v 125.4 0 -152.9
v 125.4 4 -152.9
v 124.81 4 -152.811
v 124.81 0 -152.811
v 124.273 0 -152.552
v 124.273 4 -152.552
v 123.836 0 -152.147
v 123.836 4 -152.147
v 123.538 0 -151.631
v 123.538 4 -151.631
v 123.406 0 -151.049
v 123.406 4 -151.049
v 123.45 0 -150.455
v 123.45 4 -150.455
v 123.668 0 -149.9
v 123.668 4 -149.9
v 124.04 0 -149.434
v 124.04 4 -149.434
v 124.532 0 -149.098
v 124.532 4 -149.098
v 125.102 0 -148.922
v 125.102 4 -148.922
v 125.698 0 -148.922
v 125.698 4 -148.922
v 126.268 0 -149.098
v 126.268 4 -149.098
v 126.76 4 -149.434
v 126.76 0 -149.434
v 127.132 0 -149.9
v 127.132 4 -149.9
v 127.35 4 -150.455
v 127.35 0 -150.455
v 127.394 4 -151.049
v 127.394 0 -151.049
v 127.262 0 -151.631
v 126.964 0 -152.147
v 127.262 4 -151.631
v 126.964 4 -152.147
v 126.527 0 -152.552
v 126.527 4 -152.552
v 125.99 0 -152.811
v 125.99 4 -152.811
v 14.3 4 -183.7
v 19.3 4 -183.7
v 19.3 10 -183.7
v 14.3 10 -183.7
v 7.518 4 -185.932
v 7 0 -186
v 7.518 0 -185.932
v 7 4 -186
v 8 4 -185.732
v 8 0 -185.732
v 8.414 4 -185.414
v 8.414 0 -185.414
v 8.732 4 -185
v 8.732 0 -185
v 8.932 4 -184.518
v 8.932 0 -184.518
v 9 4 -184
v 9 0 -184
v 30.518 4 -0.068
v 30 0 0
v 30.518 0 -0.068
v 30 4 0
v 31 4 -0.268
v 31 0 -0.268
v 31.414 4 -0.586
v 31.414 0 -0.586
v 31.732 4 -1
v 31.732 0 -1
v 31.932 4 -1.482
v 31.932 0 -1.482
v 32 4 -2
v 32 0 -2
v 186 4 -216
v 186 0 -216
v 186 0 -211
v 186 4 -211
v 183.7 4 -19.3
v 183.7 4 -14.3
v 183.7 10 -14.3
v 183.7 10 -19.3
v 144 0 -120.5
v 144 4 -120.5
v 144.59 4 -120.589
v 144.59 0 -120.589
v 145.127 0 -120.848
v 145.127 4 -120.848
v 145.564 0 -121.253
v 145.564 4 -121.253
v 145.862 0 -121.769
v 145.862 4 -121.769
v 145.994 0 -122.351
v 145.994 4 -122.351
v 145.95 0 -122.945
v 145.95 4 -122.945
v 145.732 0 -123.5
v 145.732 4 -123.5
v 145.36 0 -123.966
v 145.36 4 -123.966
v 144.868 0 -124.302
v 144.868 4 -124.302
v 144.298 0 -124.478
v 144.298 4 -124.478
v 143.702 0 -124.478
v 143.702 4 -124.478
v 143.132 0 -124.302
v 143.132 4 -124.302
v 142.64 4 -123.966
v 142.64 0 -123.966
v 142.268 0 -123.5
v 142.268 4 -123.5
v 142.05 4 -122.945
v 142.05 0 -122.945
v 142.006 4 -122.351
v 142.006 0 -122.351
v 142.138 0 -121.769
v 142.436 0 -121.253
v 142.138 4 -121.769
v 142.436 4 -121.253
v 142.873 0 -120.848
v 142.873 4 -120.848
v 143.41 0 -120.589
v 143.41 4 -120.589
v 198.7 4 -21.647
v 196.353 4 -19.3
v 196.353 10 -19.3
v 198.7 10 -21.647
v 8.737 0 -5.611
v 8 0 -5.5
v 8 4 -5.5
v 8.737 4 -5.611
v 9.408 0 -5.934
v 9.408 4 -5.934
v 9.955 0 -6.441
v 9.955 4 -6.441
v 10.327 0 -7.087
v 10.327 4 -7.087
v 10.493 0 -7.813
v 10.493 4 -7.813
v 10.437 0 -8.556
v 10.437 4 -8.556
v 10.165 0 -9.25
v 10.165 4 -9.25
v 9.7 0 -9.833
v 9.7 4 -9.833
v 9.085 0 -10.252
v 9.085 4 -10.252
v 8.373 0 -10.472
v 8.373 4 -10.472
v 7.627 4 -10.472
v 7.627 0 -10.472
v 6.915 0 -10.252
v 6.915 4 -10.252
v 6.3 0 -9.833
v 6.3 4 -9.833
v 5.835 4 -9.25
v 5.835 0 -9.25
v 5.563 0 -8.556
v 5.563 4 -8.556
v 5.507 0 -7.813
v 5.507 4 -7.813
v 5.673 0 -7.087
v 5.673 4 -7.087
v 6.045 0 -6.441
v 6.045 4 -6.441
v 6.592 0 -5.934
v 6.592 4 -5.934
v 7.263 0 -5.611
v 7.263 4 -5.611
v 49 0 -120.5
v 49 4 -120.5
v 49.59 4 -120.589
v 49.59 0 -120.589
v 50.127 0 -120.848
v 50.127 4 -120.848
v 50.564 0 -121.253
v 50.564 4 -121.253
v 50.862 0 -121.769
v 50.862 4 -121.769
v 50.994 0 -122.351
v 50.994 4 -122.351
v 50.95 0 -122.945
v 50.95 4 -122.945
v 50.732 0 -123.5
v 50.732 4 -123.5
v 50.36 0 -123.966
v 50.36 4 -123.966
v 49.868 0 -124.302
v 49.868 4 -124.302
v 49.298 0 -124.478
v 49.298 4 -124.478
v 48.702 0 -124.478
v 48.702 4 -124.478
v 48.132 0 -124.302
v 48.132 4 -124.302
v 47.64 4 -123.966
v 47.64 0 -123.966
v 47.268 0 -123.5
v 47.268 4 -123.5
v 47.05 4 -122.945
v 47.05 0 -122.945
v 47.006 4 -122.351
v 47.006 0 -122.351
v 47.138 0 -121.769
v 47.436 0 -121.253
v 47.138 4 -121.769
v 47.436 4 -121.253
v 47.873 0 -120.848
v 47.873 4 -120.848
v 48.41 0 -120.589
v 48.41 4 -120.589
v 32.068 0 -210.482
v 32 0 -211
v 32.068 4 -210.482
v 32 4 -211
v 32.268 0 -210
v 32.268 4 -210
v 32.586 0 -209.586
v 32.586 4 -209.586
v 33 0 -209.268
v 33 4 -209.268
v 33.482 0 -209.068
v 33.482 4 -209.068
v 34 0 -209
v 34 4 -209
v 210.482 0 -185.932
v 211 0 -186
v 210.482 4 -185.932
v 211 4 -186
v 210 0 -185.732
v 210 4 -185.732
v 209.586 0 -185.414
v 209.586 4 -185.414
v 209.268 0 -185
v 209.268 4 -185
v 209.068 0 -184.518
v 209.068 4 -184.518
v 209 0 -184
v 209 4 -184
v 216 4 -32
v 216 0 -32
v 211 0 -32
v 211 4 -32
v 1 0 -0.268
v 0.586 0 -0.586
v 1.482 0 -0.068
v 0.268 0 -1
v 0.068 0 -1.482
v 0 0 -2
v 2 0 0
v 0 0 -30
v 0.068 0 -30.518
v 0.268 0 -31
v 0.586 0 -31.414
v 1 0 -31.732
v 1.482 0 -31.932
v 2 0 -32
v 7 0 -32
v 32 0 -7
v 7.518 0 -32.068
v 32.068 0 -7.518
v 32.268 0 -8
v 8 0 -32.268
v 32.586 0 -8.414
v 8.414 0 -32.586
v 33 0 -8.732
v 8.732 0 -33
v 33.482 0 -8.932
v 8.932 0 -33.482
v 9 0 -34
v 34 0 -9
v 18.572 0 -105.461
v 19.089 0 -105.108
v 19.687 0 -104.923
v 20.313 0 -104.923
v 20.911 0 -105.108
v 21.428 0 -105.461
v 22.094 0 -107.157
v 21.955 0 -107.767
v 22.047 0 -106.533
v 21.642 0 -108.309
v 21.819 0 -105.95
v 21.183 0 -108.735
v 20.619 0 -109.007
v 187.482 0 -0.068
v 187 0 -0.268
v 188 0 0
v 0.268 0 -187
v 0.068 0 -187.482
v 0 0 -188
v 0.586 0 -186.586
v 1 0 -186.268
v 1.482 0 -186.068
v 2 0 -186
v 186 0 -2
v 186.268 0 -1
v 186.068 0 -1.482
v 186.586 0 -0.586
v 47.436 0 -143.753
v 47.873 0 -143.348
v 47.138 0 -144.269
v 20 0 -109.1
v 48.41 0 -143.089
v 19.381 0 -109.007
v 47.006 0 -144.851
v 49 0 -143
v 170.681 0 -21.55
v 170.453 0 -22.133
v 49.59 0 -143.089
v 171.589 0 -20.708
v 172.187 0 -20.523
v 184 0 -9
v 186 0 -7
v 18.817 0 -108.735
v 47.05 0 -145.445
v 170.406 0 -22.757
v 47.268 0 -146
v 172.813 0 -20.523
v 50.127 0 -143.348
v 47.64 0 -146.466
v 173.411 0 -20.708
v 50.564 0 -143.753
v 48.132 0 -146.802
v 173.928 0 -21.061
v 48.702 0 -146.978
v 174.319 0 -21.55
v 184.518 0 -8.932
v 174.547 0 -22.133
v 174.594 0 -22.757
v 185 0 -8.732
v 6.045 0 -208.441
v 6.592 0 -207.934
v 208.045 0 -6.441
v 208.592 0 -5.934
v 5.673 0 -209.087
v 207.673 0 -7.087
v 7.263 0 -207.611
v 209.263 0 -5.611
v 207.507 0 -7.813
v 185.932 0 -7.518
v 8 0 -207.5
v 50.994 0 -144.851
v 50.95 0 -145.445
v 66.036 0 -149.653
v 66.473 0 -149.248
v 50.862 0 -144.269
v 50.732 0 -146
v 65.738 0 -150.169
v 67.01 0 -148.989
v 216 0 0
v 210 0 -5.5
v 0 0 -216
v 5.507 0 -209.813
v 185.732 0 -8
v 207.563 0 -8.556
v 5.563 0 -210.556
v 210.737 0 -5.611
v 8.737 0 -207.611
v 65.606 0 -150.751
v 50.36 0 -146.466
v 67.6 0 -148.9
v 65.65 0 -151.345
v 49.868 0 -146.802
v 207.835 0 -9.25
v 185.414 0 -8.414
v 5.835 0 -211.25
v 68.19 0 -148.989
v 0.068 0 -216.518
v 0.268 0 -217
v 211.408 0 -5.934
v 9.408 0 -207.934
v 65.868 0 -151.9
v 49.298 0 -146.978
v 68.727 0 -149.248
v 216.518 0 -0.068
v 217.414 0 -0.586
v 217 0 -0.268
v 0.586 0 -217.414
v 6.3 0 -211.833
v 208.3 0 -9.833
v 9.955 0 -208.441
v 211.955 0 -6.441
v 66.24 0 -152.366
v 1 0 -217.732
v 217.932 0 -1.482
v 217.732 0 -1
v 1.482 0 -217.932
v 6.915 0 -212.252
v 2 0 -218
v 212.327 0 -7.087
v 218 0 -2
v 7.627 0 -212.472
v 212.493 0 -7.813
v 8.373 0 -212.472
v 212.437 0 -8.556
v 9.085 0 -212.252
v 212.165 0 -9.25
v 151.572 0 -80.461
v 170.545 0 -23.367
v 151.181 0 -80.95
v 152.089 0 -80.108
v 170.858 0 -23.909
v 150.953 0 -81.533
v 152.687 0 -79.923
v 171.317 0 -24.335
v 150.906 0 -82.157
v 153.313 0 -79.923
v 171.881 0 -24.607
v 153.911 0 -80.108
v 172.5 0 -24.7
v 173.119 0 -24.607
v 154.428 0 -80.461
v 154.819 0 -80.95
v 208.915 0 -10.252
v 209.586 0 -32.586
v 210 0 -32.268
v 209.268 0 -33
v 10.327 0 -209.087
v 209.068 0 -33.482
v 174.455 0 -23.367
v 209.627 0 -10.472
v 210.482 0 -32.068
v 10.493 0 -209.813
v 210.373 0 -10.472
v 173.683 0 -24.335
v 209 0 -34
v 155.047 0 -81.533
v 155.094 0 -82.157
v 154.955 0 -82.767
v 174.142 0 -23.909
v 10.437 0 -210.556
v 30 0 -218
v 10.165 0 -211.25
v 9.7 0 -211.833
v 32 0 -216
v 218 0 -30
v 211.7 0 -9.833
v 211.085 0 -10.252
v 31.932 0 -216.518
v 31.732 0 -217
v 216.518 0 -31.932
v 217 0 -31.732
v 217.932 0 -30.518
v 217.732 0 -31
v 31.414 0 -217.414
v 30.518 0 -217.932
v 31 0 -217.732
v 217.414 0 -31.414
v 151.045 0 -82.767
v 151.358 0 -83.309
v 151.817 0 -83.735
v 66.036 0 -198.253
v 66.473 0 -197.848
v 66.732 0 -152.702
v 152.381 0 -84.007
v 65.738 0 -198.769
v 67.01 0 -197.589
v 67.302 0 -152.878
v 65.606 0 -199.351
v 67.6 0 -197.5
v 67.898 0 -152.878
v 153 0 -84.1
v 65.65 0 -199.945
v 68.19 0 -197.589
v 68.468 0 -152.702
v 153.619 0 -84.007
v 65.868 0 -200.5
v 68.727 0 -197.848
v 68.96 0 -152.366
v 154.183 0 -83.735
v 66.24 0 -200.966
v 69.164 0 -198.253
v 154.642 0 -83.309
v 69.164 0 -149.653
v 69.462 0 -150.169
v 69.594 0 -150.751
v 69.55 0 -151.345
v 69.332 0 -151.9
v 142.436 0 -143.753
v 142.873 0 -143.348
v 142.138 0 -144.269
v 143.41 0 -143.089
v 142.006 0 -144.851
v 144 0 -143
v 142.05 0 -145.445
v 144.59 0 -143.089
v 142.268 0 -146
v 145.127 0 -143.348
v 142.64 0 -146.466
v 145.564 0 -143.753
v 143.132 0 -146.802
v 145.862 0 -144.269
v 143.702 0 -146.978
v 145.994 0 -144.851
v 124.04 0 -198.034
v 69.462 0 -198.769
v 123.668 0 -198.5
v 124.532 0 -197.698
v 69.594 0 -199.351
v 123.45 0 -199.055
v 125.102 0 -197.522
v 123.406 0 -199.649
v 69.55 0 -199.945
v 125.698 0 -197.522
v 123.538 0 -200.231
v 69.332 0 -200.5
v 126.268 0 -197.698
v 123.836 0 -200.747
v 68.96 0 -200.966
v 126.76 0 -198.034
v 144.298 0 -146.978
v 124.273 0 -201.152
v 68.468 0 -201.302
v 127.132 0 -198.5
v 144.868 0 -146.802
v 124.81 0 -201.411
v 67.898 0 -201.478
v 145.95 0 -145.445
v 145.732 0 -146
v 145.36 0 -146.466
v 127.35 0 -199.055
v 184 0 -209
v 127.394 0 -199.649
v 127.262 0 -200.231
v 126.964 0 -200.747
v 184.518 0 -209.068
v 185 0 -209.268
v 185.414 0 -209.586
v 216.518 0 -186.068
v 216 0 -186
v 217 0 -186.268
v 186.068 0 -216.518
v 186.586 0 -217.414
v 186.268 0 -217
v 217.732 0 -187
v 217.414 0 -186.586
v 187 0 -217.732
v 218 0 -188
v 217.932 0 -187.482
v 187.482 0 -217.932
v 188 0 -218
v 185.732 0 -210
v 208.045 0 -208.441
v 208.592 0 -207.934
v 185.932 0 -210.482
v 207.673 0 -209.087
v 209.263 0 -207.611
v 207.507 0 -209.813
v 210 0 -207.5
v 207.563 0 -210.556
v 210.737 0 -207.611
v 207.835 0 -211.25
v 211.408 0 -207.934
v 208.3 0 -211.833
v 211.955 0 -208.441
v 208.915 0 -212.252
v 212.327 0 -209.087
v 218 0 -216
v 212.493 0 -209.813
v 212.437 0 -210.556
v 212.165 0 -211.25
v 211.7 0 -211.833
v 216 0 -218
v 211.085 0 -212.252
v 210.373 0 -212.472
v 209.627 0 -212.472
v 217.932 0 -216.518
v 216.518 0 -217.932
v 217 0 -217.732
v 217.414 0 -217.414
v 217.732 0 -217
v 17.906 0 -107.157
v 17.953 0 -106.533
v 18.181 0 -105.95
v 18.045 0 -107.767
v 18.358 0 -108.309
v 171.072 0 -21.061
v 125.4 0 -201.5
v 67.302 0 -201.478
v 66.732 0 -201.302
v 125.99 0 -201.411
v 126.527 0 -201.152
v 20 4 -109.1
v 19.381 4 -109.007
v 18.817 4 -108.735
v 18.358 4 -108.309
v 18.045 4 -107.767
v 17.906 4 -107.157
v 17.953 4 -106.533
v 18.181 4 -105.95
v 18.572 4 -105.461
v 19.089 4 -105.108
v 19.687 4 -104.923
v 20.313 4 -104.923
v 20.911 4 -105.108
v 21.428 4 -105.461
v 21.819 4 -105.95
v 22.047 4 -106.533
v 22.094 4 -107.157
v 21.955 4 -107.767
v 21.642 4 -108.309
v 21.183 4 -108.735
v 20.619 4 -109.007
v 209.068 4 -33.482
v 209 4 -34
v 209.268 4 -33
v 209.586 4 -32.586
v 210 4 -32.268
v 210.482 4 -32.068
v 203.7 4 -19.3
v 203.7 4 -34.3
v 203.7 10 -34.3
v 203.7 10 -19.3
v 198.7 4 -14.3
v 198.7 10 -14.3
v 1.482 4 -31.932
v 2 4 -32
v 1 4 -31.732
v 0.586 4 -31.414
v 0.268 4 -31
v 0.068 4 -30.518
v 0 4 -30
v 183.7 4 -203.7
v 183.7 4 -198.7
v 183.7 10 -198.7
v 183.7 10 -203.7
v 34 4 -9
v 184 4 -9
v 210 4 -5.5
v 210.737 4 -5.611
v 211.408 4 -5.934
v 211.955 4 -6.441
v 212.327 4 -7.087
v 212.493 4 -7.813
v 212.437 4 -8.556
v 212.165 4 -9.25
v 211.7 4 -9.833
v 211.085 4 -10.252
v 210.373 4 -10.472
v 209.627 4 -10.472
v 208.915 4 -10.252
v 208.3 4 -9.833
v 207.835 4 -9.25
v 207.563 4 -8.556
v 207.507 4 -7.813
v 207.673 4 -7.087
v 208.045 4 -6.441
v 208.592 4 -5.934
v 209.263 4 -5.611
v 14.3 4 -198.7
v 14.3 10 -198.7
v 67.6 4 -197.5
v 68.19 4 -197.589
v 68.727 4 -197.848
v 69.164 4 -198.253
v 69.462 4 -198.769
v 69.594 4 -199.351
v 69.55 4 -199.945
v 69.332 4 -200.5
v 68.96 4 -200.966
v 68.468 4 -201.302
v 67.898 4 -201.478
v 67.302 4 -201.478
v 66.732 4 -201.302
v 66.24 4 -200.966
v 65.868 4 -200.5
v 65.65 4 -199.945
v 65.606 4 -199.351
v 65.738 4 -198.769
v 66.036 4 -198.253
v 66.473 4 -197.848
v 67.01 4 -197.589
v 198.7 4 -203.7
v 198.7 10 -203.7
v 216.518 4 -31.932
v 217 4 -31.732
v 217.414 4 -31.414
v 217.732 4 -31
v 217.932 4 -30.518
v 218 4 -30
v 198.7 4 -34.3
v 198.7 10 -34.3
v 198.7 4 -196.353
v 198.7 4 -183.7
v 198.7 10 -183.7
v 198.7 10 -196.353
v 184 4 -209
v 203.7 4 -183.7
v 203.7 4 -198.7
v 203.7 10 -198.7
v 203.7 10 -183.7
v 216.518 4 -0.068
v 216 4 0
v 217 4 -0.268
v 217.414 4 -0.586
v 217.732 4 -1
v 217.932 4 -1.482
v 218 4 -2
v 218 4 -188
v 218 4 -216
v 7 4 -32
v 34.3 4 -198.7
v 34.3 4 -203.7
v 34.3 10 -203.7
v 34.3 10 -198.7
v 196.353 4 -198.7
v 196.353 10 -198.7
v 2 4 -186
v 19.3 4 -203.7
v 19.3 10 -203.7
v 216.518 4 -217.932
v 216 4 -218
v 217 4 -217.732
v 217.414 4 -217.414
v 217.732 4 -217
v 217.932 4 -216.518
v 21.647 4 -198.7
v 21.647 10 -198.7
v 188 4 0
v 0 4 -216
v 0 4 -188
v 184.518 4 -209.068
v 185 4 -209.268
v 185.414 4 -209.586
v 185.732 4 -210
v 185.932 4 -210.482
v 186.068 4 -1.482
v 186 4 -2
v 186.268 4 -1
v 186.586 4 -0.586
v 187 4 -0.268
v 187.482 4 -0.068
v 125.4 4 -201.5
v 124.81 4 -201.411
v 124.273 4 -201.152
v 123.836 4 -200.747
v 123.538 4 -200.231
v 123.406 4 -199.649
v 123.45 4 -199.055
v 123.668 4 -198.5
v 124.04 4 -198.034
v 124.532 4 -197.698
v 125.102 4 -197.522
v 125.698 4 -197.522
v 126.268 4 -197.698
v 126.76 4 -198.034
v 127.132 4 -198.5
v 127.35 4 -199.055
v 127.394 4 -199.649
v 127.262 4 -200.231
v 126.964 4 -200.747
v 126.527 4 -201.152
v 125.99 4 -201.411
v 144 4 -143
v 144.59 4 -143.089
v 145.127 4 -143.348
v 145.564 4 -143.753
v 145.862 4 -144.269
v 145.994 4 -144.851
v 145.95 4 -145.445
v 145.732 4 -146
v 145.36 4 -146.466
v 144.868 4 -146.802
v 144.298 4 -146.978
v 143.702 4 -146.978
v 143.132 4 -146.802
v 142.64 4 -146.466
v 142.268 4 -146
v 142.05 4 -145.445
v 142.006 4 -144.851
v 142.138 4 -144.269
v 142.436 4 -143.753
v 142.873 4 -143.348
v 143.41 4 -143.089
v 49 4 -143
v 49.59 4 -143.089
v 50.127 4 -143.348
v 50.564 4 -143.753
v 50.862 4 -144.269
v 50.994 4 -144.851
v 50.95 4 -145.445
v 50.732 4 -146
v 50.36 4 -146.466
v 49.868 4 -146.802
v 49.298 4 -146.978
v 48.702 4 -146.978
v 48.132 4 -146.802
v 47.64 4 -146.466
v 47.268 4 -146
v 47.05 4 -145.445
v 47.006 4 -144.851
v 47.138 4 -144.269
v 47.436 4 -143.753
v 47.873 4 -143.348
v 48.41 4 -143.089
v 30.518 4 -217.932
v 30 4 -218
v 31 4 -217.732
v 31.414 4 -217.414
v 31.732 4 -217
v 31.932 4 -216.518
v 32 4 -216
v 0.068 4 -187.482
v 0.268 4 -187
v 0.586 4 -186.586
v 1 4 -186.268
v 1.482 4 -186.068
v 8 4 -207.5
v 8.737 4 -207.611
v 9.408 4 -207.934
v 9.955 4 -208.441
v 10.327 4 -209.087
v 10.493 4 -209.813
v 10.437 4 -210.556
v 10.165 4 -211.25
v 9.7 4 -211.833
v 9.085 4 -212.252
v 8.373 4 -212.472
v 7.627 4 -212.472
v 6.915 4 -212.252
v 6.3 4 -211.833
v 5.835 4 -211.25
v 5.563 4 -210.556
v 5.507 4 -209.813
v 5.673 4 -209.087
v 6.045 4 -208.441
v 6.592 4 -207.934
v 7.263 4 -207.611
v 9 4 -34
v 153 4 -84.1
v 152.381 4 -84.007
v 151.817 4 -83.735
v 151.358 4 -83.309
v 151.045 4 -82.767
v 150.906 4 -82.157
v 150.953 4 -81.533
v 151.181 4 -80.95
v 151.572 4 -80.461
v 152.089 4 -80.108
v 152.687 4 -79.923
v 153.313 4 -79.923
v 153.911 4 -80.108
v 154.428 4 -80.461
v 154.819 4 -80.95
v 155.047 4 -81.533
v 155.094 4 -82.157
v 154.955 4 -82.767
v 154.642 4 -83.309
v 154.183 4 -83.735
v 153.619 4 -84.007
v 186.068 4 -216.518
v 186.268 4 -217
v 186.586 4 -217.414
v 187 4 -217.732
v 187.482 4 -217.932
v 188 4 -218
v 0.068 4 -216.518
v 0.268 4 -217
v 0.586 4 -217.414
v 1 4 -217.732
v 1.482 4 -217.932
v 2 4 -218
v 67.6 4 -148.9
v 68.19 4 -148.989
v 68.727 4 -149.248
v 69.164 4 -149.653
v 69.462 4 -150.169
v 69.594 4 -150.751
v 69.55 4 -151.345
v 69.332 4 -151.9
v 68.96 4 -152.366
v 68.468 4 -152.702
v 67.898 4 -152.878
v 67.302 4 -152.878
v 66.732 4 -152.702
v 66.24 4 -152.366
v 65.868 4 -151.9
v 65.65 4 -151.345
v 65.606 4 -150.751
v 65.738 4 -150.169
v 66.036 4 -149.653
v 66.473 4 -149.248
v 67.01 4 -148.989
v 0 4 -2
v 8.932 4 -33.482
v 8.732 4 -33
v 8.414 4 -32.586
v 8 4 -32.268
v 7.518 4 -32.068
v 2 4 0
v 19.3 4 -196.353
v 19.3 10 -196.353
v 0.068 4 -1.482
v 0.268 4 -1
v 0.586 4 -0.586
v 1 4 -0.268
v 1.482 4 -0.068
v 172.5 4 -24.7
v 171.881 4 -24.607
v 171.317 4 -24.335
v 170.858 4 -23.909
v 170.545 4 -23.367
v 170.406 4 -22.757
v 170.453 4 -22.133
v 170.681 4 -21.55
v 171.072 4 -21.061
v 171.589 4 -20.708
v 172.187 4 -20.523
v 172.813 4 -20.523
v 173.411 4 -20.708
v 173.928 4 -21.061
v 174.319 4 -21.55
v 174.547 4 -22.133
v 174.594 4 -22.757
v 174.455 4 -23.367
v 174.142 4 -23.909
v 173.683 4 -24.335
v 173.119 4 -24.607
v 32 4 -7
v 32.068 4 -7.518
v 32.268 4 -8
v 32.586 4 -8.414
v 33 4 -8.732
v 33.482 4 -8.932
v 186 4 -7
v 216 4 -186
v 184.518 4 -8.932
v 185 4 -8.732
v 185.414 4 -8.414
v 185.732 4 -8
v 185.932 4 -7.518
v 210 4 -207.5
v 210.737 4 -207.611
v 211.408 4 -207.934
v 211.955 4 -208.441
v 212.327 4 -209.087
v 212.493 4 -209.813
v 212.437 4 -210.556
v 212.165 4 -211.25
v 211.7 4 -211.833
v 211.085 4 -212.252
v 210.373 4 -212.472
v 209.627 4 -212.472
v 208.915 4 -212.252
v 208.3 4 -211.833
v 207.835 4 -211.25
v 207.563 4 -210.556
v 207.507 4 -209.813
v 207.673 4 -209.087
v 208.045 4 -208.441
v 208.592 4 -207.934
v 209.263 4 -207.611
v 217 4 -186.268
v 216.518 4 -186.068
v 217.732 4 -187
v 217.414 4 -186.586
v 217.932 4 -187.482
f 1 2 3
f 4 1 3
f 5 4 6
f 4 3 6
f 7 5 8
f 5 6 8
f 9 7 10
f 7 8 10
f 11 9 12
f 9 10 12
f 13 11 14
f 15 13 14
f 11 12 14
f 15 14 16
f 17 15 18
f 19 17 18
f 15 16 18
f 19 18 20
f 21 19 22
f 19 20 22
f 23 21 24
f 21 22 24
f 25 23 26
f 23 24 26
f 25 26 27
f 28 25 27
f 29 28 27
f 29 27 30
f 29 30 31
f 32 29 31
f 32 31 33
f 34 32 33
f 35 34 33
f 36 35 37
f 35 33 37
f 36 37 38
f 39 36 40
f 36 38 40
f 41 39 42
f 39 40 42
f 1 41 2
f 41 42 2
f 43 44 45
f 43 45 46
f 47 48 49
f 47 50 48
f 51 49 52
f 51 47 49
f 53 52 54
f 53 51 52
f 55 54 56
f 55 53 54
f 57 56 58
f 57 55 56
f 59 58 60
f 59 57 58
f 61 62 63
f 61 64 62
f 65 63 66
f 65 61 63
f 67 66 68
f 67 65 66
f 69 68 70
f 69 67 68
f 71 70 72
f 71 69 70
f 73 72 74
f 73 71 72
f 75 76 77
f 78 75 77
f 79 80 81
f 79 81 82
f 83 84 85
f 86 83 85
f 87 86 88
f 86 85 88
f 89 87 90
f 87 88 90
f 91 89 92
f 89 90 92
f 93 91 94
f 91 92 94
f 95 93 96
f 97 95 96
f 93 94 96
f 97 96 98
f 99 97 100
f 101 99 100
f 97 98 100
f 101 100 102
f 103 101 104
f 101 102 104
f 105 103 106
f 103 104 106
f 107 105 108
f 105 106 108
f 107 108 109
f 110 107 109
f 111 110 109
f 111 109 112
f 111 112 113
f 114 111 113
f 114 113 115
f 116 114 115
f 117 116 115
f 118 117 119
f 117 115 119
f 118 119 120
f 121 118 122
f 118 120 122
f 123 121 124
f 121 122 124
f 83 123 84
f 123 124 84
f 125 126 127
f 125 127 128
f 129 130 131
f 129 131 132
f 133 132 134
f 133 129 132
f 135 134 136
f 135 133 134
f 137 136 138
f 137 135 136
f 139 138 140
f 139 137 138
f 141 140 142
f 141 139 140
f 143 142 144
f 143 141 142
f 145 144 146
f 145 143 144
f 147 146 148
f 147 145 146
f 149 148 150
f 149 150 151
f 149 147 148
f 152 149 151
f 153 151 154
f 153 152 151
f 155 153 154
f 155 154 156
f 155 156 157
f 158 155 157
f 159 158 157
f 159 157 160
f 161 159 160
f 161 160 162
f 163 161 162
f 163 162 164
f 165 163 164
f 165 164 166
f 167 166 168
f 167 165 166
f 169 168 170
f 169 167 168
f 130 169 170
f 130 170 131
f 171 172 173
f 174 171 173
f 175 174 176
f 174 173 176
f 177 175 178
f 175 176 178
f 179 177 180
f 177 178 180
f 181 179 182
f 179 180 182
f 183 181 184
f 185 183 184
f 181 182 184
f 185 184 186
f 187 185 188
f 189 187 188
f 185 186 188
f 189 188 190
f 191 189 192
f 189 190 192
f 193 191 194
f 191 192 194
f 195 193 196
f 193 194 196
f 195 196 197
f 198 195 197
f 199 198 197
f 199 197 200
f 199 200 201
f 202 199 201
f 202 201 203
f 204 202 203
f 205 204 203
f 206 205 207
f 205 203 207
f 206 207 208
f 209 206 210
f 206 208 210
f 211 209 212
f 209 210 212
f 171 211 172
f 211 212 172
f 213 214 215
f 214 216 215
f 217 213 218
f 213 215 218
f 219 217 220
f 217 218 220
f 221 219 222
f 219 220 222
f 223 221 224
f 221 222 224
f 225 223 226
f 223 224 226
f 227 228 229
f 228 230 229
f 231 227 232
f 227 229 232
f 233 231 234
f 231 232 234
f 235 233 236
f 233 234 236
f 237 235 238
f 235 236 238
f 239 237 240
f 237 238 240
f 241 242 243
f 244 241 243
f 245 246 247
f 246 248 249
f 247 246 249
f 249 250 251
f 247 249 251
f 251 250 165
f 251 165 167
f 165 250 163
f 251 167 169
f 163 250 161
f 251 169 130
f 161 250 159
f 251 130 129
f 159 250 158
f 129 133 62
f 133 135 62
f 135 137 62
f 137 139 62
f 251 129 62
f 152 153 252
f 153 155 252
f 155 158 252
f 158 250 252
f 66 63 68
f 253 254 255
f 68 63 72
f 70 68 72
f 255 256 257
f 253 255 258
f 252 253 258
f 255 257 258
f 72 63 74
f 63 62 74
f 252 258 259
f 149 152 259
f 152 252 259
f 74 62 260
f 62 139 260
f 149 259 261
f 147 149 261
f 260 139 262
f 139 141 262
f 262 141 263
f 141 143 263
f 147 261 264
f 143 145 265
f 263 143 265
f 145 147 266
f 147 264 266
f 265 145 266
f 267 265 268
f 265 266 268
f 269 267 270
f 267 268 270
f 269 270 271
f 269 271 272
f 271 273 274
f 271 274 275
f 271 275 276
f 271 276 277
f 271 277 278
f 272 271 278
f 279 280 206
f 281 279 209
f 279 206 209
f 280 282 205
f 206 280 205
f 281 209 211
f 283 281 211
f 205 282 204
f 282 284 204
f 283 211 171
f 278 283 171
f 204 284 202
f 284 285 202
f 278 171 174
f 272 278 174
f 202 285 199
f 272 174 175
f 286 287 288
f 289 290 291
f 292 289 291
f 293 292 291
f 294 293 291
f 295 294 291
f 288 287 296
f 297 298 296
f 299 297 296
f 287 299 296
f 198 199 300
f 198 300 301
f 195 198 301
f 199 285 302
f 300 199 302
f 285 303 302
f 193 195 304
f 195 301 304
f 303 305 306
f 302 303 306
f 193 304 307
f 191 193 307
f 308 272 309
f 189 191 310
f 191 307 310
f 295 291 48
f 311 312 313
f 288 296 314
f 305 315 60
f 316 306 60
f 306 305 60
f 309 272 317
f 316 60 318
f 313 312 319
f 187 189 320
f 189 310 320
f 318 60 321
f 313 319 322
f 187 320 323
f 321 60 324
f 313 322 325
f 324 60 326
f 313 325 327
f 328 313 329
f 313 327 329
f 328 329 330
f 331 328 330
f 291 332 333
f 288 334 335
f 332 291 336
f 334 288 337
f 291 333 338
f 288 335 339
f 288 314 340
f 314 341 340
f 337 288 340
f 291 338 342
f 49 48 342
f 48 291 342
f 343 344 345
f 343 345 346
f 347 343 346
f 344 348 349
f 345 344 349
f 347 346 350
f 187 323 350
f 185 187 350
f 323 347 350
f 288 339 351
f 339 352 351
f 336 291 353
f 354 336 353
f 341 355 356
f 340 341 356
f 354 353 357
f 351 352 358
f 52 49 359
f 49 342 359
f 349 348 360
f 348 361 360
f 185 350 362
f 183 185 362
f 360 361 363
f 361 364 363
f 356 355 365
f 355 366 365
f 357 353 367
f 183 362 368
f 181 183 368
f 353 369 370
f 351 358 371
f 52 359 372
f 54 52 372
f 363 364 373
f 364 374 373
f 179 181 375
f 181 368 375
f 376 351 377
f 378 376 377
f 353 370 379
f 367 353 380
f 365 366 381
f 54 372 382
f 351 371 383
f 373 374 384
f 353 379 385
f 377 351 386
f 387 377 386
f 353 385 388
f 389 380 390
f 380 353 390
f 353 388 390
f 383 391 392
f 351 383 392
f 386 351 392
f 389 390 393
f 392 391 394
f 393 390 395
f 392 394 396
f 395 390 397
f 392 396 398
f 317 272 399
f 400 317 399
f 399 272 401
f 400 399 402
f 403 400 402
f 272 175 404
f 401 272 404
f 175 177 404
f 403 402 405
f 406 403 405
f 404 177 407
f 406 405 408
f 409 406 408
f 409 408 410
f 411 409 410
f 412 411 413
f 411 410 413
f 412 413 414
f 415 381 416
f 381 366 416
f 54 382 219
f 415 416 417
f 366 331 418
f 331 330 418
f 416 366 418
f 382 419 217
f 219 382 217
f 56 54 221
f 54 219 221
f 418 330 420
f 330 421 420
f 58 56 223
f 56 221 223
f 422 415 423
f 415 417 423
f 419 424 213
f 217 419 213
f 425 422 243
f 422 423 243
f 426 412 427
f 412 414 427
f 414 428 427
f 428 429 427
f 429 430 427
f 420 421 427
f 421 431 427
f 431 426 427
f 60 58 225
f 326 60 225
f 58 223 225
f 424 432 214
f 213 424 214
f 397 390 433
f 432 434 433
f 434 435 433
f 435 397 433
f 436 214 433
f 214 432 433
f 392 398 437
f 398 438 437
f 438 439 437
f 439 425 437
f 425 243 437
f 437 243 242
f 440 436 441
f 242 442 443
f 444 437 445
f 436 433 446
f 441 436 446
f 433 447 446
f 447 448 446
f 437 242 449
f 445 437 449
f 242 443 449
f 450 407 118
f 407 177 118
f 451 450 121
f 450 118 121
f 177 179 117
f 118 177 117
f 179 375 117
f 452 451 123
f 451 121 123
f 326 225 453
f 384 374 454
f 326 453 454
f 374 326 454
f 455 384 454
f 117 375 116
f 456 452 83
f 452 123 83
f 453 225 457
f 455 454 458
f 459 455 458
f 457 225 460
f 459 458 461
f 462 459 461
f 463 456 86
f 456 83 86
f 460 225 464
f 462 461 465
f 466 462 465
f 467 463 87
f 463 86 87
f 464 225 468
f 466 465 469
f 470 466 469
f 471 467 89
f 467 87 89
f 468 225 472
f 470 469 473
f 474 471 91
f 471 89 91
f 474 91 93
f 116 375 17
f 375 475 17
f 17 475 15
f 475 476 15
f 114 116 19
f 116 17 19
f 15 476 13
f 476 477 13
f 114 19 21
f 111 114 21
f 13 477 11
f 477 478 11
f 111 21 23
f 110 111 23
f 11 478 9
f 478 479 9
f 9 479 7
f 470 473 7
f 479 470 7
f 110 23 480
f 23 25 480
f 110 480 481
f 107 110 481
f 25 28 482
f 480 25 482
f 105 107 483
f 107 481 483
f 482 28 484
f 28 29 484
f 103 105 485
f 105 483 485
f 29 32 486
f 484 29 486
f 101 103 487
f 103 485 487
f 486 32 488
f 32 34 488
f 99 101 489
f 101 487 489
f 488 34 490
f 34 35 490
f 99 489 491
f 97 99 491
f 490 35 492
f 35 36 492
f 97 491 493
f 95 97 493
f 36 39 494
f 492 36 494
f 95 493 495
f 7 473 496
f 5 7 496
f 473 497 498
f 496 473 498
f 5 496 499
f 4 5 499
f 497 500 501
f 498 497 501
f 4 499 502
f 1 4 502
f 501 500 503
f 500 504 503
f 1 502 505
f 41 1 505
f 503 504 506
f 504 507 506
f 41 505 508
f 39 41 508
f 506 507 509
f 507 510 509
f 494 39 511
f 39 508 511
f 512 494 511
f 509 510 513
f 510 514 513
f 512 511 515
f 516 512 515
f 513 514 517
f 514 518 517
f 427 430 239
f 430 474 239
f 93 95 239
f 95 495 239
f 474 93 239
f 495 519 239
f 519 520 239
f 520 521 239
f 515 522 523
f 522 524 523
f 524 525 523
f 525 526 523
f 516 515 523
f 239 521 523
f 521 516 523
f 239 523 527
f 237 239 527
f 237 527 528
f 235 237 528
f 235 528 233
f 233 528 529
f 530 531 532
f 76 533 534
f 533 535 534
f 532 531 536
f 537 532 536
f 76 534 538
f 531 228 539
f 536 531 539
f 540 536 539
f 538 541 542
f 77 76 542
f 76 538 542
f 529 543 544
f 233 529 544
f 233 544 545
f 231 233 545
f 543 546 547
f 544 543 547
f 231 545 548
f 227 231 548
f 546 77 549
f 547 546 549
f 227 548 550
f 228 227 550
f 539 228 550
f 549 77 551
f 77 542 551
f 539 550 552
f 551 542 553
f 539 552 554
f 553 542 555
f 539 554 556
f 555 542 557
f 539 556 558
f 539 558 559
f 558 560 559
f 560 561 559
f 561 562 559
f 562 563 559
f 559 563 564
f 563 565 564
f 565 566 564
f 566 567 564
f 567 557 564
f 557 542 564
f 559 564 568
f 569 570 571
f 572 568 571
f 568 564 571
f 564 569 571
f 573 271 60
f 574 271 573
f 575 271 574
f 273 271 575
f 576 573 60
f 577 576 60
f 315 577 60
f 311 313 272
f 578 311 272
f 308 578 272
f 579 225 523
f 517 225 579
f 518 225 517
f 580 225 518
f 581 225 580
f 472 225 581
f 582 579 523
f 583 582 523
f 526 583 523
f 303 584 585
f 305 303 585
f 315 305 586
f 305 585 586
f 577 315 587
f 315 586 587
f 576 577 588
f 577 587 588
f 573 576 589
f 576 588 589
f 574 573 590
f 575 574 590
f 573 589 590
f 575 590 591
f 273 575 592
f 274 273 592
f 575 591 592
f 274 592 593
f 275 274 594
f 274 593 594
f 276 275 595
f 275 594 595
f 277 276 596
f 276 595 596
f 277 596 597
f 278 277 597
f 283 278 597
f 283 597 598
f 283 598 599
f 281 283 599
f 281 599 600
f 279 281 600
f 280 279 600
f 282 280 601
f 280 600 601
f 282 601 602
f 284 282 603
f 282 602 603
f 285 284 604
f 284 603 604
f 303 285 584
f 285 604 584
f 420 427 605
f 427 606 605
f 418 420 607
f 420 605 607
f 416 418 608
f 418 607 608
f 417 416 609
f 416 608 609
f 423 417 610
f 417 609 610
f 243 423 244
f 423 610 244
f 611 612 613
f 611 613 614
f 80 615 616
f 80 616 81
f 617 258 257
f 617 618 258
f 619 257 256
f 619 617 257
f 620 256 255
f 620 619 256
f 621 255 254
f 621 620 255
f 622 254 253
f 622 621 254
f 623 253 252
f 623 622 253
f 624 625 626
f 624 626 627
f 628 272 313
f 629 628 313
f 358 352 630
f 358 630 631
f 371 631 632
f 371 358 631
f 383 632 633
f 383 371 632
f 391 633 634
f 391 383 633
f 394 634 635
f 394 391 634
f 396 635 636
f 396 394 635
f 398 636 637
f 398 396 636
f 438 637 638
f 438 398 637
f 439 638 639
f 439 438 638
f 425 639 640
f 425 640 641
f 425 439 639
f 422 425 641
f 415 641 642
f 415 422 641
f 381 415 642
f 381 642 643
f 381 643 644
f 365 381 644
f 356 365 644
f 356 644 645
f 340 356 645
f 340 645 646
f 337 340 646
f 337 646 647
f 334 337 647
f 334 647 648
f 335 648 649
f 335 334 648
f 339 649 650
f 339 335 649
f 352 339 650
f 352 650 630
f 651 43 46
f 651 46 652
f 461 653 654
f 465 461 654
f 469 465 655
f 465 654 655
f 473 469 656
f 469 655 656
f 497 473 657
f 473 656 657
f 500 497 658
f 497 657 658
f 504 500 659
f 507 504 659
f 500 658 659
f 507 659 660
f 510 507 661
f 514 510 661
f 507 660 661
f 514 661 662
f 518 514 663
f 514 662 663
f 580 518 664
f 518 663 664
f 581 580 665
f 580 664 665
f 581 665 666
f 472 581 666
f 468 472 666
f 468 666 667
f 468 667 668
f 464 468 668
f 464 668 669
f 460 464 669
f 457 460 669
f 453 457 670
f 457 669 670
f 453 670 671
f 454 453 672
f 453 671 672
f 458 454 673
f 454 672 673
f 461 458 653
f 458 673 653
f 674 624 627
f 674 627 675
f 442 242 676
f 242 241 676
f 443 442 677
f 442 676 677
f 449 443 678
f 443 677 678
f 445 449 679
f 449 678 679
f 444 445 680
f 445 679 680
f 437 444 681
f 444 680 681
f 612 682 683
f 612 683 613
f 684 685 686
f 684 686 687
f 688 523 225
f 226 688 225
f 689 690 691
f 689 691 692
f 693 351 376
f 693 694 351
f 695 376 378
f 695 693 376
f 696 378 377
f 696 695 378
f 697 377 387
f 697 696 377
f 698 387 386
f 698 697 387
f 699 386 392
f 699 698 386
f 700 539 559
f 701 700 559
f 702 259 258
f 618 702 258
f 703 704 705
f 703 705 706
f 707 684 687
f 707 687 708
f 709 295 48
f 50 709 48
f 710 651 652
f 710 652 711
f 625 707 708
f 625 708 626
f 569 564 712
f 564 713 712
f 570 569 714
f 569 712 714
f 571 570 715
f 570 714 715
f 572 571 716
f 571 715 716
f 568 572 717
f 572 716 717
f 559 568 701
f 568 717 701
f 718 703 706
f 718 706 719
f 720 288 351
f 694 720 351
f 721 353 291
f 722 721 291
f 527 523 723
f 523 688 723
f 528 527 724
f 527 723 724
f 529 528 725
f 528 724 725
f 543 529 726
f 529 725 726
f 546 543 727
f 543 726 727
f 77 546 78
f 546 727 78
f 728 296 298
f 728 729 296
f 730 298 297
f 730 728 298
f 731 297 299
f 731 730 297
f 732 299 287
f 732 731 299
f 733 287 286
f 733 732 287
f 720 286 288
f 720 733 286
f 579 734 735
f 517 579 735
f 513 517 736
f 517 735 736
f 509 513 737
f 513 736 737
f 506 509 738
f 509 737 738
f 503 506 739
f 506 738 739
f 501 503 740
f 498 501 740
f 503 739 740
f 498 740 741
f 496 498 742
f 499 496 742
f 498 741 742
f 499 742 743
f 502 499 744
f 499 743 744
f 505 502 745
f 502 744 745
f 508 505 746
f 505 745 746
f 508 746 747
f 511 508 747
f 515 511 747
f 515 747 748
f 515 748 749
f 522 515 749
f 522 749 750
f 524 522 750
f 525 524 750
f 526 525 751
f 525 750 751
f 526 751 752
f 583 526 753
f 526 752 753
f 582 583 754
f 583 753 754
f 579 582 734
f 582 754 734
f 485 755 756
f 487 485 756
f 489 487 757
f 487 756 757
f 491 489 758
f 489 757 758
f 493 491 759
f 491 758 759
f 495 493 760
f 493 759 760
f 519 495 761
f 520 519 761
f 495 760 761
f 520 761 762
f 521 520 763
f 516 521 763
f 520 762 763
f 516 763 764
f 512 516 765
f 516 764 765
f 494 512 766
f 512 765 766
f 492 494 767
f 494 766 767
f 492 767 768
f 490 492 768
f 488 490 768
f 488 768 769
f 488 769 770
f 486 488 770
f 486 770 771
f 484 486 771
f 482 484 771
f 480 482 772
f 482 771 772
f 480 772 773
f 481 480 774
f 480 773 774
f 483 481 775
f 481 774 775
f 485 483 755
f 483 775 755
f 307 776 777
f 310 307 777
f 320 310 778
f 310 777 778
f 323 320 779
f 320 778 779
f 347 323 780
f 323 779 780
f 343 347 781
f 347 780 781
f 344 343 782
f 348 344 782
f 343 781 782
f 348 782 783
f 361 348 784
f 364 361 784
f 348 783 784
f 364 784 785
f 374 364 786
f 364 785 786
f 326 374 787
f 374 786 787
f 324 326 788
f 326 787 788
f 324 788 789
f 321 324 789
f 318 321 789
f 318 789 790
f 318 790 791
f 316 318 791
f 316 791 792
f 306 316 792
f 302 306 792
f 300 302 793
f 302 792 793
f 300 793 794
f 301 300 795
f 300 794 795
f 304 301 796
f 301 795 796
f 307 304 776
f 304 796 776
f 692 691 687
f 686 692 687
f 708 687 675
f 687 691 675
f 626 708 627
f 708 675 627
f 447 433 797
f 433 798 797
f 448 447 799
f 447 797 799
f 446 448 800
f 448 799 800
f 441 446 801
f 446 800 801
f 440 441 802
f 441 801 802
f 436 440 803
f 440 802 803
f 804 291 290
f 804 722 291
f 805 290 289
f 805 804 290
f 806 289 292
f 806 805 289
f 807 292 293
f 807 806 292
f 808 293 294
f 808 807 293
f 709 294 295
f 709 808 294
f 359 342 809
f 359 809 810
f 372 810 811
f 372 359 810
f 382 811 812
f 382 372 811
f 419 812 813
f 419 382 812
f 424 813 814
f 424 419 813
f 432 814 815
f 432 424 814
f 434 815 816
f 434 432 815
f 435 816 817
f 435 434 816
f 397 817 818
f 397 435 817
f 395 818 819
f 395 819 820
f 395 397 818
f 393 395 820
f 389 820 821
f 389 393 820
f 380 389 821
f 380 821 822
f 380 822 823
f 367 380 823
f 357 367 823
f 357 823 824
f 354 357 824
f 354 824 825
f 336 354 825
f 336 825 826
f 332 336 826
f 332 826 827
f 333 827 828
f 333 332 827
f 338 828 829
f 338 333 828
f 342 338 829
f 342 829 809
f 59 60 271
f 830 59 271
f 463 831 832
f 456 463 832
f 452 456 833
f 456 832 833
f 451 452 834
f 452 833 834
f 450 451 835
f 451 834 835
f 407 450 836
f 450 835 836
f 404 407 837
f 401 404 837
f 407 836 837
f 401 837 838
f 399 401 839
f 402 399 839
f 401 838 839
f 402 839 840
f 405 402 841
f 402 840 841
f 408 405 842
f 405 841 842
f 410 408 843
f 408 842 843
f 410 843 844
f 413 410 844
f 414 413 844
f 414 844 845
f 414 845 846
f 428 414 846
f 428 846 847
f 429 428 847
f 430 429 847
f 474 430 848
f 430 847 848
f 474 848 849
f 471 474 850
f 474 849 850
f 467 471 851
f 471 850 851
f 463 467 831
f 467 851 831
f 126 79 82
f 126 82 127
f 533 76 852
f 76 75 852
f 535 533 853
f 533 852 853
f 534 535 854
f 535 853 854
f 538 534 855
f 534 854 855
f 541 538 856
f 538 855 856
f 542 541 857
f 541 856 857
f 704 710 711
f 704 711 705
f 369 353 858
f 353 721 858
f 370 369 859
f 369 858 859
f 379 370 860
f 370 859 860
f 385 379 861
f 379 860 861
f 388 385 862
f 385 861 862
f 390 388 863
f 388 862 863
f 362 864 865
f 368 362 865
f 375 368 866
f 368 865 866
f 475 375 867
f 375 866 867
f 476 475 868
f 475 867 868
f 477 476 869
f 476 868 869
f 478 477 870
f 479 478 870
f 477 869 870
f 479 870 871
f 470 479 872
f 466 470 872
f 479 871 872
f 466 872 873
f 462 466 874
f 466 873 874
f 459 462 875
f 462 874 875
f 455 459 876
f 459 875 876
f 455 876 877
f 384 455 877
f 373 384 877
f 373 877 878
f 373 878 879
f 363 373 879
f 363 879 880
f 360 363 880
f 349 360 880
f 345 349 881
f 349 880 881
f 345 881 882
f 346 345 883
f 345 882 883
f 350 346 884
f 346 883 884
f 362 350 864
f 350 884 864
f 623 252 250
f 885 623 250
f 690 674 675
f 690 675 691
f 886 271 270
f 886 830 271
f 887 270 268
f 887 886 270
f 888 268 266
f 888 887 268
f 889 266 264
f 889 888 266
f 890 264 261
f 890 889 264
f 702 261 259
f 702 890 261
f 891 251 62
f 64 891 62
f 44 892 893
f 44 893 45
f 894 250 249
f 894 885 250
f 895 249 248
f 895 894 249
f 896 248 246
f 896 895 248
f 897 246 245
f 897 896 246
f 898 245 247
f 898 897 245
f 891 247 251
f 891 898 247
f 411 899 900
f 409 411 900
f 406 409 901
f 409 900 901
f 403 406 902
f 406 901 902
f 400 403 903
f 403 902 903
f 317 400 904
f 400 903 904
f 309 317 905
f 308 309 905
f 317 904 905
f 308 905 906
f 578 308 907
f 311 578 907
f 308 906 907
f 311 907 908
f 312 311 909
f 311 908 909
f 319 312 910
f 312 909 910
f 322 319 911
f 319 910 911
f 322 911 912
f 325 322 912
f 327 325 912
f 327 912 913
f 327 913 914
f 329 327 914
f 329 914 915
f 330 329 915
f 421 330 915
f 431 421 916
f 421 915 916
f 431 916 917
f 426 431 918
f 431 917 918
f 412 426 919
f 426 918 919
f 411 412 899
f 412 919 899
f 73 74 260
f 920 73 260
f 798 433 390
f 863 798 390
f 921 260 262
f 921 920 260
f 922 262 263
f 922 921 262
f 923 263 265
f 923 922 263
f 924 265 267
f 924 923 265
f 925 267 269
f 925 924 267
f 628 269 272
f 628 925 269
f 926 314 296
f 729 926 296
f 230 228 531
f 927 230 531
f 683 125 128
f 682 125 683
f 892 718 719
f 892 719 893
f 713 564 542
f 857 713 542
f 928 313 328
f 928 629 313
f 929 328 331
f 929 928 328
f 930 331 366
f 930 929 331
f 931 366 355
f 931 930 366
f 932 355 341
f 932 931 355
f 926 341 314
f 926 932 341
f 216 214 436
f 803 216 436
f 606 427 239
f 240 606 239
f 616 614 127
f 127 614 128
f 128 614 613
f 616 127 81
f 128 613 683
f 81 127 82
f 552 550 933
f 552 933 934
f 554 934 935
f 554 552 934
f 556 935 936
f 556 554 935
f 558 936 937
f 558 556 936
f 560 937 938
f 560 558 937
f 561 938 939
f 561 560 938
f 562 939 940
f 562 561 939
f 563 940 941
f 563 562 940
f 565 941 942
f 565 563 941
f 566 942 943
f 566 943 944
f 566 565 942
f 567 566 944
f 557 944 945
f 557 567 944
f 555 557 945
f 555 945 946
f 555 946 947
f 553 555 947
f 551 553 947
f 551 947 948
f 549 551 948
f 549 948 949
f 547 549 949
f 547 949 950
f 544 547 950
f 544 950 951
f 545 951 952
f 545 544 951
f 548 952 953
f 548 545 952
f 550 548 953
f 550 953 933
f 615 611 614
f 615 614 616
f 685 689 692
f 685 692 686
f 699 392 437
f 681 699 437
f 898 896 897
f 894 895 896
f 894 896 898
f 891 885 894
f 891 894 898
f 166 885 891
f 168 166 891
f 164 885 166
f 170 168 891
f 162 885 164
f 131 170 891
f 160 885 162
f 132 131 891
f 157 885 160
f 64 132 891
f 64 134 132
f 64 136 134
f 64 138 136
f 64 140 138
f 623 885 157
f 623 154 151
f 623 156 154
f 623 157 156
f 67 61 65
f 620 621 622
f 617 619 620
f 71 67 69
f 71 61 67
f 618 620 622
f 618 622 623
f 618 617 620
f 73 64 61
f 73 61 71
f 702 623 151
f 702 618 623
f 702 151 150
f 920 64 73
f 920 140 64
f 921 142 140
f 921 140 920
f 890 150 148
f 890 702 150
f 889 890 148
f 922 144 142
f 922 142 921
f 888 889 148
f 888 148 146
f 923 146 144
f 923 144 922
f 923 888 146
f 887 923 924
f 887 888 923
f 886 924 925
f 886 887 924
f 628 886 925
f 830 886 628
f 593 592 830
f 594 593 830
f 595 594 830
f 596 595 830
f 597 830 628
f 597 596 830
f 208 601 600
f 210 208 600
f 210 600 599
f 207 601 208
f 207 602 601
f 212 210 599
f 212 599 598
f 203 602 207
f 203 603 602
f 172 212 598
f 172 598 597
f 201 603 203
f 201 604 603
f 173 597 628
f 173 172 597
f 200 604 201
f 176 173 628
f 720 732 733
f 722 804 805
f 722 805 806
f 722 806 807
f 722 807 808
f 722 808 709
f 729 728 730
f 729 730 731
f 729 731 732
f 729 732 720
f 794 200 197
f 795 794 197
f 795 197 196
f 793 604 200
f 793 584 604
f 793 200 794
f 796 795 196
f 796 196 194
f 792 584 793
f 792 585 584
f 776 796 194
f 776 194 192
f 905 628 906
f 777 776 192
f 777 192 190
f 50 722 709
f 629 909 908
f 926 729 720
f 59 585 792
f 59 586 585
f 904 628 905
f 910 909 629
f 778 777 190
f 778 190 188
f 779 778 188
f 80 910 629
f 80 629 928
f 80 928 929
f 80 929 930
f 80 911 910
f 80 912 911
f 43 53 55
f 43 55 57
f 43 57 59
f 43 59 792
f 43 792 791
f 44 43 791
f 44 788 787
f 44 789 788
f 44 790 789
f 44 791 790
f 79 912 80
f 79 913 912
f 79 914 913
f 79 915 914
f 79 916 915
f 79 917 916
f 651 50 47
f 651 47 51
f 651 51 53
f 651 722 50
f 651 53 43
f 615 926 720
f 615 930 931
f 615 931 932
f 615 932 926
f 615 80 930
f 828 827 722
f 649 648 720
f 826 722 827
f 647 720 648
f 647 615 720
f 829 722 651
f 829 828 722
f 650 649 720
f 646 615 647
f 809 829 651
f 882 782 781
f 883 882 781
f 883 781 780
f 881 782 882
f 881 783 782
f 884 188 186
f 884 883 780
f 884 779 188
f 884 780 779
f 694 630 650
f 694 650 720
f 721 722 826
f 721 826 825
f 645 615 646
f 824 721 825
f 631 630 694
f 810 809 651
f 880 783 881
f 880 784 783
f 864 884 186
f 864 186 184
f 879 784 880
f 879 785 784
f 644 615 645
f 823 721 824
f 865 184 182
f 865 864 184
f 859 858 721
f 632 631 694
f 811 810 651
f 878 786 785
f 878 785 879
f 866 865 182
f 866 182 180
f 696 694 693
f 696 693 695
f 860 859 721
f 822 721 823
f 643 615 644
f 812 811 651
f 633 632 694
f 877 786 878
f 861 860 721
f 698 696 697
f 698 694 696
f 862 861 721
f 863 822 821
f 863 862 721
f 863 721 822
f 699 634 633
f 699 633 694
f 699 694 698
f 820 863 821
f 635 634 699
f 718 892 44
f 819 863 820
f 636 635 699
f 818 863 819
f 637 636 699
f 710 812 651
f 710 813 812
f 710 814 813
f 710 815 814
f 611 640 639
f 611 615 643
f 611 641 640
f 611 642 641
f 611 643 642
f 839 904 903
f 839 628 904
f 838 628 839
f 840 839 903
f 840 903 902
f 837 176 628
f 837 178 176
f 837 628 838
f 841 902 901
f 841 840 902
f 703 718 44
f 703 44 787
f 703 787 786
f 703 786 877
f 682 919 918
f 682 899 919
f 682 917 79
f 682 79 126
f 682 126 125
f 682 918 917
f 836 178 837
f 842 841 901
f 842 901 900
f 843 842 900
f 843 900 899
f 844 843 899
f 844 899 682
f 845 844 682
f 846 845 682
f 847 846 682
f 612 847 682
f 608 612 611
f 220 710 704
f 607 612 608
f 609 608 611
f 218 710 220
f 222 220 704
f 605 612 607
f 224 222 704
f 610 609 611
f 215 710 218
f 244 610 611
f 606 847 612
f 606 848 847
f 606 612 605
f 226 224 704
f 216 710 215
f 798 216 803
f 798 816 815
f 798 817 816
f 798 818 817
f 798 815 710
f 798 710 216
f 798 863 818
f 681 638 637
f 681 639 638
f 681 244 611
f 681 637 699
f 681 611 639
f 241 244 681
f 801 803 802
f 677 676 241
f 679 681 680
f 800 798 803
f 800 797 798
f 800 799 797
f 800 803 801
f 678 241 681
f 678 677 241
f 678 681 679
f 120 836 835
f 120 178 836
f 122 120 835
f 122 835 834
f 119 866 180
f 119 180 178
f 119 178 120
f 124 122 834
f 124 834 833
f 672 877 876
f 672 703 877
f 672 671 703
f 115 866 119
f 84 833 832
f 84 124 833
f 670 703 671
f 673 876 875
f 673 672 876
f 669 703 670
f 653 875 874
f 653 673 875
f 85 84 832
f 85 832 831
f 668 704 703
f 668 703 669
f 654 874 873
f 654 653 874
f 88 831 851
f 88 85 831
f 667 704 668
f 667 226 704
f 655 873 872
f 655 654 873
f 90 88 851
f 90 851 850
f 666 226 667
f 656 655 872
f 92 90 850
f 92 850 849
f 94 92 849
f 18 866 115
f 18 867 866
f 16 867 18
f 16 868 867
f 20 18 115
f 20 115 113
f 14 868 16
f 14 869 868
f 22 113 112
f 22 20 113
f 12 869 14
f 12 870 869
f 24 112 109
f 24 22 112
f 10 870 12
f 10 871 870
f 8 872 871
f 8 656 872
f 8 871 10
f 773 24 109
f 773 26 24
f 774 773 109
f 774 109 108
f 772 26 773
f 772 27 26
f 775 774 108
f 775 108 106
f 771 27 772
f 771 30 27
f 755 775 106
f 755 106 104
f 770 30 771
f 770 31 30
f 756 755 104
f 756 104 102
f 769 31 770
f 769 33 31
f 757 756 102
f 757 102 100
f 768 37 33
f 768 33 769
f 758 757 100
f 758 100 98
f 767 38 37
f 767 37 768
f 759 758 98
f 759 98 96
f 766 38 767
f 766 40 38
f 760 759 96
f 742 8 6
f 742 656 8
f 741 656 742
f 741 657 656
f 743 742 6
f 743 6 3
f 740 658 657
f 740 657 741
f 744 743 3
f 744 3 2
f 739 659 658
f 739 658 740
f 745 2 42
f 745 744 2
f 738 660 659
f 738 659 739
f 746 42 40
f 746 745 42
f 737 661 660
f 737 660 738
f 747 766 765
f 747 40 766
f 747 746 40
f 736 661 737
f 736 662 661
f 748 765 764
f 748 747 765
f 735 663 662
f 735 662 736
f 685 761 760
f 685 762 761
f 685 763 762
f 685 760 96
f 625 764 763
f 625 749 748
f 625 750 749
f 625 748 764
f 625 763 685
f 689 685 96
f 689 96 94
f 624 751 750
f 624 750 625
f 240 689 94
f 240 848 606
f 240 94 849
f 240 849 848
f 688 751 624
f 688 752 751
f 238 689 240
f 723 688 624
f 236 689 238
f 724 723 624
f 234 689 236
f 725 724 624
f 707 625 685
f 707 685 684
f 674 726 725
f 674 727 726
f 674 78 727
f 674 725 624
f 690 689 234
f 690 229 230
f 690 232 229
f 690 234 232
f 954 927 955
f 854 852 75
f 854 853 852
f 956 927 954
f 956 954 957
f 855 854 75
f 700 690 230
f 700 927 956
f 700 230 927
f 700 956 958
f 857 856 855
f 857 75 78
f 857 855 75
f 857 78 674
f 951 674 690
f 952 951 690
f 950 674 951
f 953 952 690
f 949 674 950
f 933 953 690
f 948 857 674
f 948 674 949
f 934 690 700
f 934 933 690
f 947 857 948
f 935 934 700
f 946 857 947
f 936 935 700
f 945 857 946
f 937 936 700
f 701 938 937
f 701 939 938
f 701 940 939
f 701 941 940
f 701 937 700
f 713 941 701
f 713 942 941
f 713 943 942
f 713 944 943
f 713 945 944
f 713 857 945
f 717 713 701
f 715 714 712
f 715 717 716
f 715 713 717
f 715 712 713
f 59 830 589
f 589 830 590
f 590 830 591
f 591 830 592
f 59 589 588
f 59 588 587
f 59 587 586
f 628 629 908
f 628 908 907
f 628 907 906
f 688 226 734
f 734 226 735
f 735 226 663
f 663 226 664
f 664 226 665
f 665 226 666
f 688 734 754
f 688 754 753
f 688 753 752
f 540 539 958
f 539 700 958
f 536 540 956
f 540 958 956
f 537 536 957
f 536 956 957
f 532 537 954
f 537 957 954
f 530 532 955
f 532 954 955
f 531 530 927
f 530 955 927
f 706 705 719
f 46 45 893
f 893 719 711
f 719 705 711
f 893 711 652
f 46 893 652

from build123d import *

# Parameters (mm, degrees)
ESQUISSE1_R             = 2.5
BOSS_EXTRU_1_DEPTH      = 4
ESQUISSE2_R             = 2.1
ESQUISSE2_R_2           = 2
ENL_V_MAT_EXTRU_1_DEPTH = 4
BOSS_EXTRU_2_DEPTH      = 6
CONG_1_R                = 2


with BuildPart() as part:
    # Esquisse1 → Boss.-Extru.1 (new body)
    with BuildSketch(Plane(origin=(0, 0, 0), x_dir=(1, 0, 0), z_dir=(0, 1, 0))):
        Polygon((0, 218), (0, 186), (9, 186), (9, 32), (0, 32), (0, 0), (32, 0), (32, 9), (186, 9), (186, 0), (218, 0), (218, 32), (209, 32), (209, 186), (218, 186), (218, 218), (186, 218), (186, 209), (32, 209), (32, 218), align=None)
        with Locations(Location((8, 210, 0), (0, 0, 270))):
            Circle(ESQUISSE1_R, mode=Mode.SUBTRACT)
        with Locations(Location((210, 210, 0), (0, 0, 270))):
            Circle(ESQUISSE1_R, mode=Mode.SUBTRACT)
        with Locations(Location((210, 8, 0), (0, 0, 270))):
            Circle(ESQUISSE1_R, mode=Mode.SUBTRACT)
        with Locations(Location((8, 8, 0), (0, 0, 270))):
            Circle(ESQUISSE1_R, mode=Mode.SUBTRACT)
    extrude(amount=BOSS_EXTRU_1_DEPTH)

    # Esquisse2 → Enlèv. mat.-Extru.1 (cut)
    with BuildSketch(Plane(origin=(0, 4, 0), x_dir=(1, 0, 0), z_dir=(0, 1, 0))):
        with Locations(Location((172.5, 22.6, 0), (0, 0, 90))):
            Circle(ESQUISSE2_R)
        with Locations(Location((153, 82, 0), (0, 0, 90))):
            Circle(ESQUISSE2_R)
        with Locations(Location((20, 107, 0), (0, 0, 90))):
            Circle(ESQUISSE2_R)
        with Locations(Location((49, 122.5, 0), (0, 0, 270))):
            Circle(ESQUISSE2_R_2)
        with Locations(Location((144, 122.5, 0), (0, 0, 270))):
            Circle(ESQUISSE2_R_2)
        with Locations(Location((144, 145, 0), (0, 0, 270))):
            Circle(ESQUISSE2_R_2)
        with Locations(Location((49, 145, 0), (0, 0, 270))):
            Circle(ESQUISSE2_R_2)
        with Locations(Location((67.6, 199.5, 0), (0, 0, 270))):
            Circle(ESQUISSE2_R_2)
        with Locations(Location((67.6, 150.9, 0), (0, 0, 270))):
            Circle(ESQUISSE2_R_2)
        with Locations(Location((125.4, 150.9, 0), (0, 0, 90))):
            Circle(ESQUISSE2_R_2)
        with Locations(Location((125.4, 199.5, 0), (0, 0, 90))):
            Circle(ESQUISSE2_R_2)
    extrude(amount=-ENL_V_MAT_EXTRU_1_DEPTH, mode=Mode.SUBTRACT)

    # Esquisse4 → Boss.-Extru.2 (add)
    with BuildSketch(Plane(origin=(0, 4, 0), x_dir=(1, 0, 0), z_dir=(0, 1, 0))):
        Polygon((198.7, 14.3), (183.7, 14.3), (183.7, 19.3), (196.353215425, 19.3), (198.7, 21.646784575), (198.7, 34.3), (203.7, 34.3), (203.7, 19.3), align=None)
        Polygon((19.3, 203.7), (34.3, 203.7), (34.3, 198.7), (21.646784575, 198.7), (19.3, 196.353215425), (19.3, 183.7), (14.3, 183.7), (14.3, 198.7), align=None)
        Polygon((203.7, 198.7), (203.7, 183.7), (198.7, 183.7), (198.7, 196.353215425), (196.353215425, 198.7), (183.7, 198.7), (183.7, 203.7), (198.7, 203.7), align=None)
    extrude(amount=BOSS_EXTRU_2_DEPTH)

    # Congé1
    cong_1_edges = [part.edges().sort_by_distance(p)[0] for p in [
        (0, 2, 0),
        (0, 2, -32),
        (9, 2, -32),
        (9, 2, -186),
        (0, 2, -186),
        (0, 2, -218),
        (32, 2, -218),
        (32, 2, -209),
        (186, 2, -209),
        (186, 2, -218),
        (218, 2, -218),
        (218, 2, -186),
        (209, 2, -186),
        (209, 2, -32),
        (218, 2, -32),
        (218, 2, 0),
        (186, 2, 0),
        (186, 2, -9),
        (32, 2, -9),
        (32, 2, 0),
    ]]
    fillet(cong_1_edges, radius=CONG_1_R)


solid = part.part
